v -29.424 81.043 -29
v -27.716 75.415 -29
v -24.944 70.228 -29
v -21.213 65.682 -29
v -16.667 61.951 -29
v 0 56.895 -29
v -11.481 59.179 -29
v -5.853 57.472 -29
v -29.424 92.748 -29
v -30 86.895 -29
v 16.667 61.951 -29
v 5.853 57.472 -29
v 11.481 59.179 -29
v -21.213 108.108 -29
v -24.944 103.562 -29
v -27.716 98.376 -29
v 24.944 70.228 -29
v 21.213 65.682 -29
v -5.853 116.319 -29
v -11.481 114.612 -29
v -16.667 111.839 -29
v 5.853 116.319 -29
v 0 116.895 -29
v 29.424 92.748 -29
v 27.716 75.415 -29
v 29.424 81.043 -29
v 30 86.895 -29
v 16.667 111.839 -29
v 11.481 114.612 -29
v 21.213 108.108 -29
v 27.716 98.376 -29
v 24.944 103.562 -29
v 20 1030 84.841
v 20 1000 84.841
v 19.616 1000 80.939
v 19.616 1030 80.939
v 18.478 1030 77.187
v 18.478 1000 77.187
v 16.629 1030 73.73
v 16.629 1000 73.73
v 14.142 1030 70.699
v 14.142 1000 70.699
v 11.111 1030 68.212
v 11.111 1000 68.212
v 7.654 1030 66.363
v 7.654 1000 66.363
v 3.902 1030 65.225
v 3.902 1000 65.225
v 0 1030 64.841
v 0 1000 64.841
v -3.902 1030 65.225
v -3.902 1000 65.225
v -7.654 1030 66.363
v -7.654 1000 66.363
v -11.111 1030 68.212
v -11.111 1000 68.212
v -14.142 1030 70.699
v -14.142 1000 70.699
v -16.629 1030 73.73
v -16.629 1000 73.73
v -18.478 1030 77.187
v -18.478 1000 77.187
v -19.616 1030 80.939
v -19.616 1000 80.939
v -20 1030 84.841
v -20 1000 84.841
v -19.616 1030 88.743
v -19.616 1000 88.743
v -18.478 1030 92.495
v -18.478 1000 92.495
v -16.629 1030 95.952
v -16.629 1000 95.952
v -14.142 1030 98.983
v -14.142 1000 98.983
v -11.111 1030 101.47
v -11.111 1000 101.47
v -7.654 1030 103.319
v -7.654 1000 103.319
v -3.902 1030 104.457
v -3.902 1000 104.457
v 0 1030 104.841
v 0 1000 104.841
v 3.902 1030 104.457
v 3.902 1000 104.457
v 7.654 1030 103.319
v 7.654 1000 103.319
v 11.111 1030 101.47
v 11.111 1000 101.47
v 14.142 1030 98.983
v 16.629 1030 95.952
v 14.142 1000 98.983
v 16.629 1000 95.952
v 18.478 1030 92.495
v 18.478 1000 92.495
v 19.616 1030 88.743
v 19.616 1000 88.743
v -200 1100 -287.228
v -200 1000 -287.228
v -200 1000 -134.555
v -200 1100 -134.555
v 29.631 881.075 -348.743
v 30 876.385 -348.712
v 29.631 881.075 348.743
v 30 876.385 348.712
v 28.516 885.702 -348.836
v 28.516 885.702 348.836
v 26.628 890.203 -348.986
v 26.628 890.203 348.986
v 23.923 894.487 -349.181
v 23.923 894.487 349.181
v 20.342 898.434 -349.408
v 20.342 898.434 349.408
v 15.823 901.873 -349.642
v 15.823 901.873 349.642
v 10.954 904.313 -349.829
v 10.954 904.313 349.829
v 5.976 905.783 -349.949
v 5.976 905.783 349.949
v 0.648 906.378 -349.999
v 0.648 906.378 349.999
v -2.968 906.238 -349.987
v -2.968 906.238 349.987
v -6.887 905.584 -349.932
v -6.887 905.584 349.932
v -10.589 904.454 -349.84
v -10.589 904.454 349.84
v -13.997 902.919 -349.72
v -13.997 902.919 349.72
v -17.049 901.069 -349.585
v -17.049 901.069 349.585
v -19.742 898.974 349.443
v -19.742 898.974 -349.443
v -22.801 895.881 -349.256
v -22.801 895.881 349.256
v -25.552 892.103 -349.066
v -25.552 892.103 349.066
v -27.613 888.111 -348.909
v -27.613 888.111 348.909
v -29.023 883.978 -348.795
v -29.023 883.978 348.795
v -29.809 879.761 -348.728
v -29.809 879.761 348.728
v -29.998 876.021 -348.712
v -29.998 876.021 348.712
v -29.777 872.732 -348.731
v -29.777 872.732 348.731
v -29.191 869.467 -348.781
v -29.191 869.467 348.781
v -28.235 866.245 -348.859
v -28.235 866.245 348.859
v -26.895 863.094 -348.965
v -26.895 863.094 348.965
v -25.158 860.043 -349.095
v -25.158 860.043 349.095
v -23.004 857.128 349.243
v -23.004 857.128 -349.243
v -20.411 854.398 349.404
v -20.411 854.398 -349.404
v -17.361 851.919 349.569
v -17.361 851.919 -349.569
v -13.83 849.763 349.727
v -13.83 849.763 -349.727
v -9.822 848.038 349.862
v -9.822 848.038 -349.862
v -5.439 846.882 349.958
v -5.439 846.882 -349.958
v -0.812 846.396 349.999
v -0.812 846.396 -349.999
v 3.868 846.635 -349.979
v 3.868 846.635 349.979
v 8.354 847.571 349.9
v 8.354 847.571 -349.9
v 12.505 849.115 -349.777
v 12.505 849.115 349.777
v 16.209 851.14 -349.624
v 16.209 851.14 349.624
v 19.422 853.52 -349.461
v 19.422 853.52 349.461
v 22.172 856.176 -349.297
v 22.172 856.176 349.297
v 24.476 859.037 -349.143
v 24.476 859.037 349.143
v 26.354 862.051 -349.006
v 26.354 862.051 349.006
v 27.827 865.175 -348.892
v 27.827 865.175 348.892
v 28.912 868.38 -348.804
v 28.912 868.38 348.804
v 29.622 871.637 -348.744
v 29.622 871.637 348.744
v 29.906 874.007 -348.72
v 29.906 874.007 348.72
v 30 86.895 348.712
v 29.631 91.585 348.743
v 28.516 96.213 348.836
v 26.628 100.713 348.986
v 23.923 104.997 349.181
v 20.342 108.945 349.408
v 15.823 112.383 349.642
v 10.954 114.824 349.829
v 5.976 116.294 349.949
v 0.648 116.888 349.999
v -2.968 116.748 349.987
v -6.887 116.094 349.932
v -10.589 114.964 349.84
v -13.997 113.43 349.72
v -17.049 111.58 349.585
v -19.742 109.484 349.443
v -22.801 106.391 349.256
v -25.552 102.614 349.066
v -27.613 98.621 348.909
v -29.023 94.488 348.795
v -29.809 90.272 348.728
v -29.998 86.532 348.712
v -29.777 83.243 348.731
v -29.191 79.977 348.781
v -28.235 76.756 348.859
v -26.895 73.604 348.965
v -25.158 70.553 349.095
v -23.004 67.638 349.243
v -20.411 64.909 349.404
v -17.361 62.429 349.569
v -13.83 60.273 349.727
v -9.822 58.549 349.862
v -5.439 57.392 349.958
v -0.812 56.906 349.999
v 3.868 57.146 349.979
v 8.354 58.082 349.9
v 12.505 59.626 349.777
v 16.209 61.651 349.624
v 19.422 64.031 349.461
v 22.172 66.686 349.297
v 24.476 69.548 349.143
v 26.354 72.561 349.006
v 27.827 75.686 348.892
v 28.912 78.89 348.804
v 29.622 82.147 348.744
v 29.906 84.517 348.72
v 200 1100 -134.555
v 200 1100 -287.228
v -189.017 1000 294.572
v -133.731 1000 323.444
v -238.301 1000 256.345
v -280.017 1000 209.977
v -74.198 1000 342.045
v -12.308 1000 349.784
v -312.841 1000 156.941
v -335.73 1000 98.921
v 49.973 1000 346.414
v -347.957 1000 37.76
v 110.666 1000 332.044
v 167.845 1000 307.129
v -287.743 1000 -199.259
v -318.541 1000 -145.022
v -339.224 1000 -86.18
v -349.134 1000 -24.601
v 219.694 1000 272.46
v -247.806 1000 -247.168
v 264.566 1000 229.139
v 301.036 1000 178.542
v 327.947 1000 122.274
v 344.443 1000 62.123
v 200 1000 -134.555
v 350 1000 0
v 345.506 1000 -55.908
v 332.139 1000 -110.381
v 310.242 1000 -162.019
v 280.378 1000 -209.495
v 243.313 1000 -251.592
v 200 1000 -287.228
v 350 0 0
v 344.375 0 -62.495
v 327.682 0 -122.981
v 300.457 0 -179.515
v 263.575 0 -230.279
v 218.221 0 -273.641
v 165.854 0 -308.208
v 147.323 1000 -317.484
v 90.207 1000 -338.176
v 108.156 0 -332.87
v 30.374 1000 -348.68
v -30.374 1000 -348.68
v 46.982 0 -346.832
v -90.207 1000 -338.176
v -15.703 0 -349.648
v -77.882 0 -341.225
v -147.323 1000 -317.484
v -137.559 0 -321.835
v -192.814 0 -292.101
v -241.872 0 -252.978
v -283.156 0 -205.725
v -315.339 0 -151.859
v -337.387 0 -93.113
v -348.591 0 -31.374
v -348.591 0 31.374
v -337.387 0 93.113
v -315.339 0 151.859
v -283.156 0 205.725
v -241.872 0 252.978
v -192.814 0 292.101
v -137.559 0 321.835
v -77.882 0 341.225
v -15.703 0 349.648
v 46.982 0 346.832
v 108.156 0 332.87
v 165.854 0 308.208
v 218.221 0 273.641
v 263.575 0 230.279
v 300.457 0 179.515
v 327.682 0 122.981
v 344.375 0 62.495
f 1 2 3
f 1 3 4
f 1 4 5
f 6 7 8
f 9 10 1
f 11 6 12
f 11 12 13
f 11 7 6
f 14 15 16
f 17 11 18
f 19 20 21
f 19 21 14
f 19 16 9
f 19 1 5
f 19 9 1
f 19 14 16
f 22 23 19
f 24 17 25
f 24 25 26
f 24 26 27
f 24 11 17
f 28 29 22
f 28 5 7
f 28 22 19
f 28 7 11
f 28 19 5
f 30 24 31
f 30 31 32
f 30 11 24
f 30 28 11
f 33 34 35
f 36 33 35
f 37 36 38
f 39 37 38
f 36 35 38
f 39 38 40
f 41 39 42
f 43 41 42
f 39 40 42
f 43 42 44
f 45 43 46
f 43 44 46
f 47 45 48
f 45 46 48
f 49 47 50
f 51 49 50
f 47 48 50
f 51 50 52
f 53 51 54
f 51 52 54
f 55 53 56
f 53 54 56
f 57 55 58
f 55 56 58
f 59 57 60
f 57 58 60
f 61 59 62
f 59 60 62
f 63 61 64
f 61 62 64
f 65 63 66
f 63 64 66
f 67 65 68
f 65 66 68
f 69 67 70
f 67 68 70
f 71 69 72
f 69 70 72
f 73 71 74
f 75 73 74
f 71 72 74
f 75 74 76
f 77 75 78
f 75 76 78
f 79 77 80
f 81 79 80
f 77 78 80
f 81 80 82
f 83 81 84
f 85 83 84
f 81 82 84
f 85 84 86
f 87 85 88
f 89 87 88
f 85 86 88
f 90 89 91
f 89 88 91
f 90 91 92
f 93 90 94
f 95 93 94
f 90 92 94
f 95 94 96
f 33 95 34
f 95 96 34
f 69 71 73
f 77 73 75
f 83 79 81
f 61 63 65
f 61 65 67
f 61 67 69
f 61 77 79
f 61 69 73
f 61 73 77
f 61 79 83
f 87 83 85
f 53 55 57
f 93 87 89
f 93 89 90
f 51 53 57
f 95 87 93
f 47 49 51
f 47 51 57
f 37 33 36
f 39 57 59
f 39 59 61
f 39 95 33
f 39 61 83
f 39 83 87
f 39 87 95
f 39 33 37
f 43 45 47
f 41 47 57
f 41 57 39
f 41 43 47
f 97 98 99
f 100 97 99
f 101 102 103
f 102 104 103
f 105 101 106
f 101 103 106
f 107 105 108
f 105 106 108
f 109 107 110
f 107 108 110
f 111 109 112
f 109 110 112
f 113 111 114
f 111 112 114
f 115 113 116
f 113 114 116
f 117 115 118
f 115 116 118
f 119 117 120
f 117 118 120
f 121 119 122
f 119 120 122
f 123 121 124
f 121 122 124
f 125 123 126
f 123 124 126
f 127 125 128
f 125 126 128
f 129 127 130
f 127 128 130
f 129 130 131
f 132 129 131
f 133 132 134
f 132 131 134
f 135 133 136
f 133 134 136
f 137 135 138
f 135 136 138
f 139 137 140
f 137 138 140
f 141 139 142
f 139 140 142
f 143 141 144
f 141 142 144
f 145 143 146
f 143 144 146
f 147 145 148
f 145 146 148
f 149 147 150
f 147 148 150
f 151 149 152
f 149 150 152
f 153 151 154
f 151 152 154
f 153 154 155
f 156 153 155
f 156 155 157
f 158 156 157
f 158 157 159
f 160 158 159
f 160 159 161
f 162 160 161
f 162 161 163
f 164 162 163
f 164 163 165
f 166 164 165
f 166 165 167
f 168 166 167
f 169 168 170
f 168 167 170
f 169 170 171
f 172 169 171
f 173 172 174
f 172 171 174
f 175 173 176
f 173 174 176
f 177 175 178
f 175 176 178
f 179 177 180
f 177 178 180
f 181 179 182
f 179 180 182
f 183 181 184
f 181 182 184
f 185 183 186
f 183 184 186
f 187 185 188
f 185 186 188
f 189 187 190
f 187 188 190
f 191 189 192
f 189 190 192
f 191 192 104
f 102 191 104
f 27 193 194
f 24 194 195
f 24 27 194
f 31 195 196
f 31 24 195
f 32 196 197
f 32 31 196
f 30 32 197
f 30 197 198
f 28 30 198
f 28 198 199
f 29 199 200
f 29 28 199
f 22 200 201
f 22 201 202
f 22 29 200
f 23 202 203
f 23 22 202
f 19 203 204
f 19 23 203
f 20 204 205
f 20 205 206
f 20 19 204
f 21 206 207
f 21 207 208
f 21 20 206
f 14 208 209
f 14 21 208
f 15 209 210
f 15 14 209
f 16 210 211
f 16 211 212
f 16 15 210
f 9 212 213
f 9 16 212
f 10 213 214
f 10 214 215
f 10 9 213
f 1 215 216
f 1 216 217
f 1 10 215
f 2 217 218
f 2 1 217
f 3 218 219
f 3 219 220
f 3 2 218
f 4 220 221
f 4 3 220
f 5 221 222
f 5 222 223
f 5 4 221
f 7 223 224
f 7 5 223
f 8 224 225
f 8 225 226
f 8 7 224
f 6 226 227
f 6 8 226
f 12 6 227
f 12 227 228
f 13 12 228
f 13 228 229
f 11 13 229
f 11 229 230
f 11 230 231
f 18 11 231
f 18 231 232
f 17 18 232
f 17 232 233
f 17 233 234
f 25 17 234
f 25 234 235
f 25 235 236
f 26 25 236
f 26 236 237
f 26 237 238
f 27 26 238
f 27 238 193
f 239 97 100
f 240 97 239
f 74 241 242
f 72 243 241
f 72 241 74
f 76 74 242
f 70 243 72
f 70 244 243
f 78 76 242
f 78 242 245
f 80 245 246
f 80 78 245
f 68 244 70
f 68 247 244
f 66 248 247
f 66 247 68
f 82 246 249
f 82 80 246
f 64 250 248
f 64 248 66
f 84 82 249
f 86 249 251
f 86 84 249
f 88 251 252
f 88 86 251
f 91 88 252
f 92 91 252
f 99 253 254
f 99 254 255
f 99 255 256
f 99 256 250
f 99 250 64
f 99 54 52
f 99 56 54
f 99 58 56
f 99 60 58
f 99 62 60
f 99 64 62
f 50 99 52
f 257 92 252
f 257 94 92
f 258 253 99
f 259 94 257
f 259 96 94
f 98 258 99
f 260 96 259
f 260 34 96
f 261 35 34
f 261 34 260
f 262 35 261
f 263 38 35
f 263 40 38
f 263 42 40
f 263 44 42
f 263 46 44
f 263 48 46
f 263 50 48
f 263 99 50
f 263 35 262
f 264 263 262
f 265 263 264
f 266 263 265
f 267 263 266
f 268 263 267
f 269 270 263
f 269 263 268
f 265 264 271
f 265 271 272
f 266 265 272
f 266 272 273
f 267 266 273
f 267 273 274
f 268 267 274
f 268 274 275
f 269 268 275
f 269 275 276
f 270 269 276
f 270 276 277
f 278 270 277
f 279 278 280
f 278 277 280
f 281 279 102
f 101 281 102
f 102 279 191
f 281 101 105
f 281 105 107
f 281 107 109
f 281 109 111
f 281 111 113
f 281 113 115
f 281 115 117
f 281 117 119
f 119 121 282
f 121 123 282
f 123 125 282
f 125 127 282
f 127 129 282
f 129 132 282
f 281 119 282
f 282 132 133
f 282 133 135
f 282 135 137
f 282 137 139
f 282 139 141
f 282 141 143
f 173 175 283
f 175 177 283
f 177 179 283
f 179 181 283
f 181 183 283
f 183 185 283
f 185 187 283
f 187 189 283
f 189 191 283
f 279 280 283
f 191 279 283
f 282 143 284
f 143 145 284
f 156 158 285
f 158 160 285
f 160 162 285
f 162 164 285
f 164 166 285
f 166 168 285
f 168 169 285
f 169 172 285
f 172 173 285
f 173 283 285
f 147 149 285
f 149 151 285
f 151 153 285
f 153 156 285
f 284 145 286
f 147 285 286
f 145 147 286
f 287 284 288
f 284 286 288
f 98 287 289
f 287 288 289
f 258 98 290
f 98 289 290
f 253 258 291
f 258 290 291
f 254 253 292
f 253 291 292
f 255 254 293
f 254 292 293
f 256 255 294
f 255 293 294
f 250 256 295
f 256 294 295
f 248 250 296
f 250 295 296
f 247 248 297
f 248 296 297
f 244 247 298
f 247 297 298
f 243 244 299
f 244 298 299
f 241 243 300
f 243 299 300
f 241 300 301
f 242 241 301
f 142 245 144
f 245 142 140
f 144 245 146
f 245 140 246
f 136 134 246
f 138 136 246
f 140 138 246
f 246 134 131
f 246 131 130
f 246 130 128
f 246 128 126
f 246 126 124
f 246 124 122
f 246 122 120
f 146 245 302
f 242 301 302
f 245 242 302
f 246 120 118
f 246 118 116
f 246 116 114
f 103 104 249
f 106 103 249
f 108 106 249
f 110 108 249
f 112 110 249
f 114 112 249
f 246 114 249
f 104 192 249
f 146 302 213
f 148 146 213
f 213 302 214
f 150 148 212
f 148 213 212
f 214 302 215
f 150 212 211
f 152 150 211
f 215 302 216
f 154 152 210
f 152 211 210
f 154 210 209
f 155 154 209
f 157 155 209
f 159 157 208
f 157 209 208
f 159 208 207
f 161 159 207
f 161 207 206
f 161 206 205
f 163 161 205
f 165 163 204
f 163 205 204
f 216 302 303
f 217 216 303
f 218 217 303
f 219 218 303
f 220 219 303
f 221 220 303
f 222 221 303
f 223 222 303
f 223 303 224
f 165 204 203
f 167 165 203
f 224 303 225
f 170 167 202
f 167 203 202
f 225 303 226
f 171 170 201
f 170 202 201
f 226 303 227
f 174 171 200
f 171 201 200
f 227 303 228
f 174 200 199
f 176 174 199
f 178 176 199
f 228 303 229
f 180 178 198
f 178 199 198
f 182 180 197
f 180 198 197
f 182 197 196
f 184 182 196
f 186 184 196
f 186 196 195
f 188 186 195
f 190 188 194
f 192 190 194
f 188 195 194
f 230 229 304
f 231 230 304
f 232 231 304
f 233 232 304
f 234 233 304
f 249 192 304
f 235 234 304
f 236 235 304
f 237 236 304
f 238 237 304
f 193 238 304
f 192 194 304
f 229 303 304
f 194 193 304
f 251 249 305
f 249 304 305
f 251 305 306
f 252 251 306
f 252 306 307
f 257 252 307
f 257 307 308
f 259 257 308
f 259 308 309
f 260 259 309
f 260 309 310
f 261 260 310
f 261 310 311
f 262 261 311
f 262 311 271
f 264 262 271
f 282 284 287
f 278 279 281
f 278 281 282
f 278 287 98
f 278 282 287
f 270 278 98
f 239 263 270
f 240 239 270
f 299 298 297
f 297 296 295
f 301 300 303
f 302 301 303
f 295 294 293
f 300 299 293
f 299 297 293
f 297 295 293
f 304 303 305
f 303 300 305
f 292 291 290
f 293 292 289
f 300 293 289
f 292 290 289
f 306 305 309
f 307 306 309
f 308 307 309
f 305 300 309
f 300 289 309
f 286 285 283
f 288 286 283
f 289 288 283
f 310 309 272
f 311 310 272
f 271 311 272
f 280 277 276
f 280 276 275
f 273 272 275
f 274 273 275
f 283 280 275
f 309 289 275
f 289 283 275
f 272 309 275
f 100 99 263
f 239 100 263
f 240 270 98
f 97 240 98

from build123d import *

# Parameters (mm, degrees)
SKETCH2_R               = 350
BOSS_EXTRUDE1_DEPTH     = 1000
SKETCH3_R               = 20
BOSS_EXTRUDE2_DEPTH     = 30
BOSS_EXTRUDE3_DEPTH     = 100
SKETCH5_R               = 30
CUT_EXTRUDE1_DEPTH      = 351
CUT_EXTRUDE1_DEPTH_BACK = 351
SKETCH6_R               = 30
CUT_EXTRUDE2_DEPTH      = 351.000000102
CUT_EXTRUDE2_DEPTH_BACK = 29


with BuildPart() as part:
    # Sketch2 → Boss-Extrude1 (new body)
    with BuildSketch(Plane(origin=(0, 0, 0), x_dir=(1, 0, 0), z_dir=(0, 1, 0))):
        Circle(SKETCH2_R)
    extrude(amount=BOSS_EXTRUDE1_DEPTH)

    # Sketch3 → Boss-Extrude2 (add)
    with BuildSketch(Plane(origin=(0, 1000, 0), x_dir=(1, 0, 0), z_dir=(0, 1, 0))):
        with Locations((0, -84.841088142)):
            Circle(SKETCH3_R)
    extrude(amount=BOSS_EXTRUDE2_DEPTH)

    # Sketch4 → Boss-Extrude3 (add)
    with BuildSketch(Plane(origin=(0, 1000, 0), x_dir=(1, 0, 0), z_dir=(0, 1, 0))):
        Polygon((0, 134.555021266), (200, 134.555021266), (200, 287.228132327), (-200, 287.228132327), (-200, 134.555021266), align=None)
    extrude(amount=BOSS_EXTRUDE3_DEPTH)

    # Sketch5 → Cut-Extrude1 (cut, two sides)
    with BuildSketch(Plane.XY) as cut_extrude1_sk:
        with Locations((0, 876.38470429)):
            Circle(SKETCH5_R)
    extrude(amount=CUT_EXTRUDE1_DEPTH, mode=Mode.SUBTRACT)
    extrude(cut_extrude1_sk.sketch, amount=-CUT_EXTRUDE1_DEPTH_BACK, mode=Mode.SUBTRACT)

    # Sketch6 → Cut-Extrude2 (cut, two sides)
    with BuildSketch(Plane.XY) as cut_extrude2_sk:
        with Locations((0, 86.895276968)):
            Circle(SKETCH6_R)
    extrude(amount=CUT_EXTRUDE2_DEPTH, mode=Mode.SUBTRACT)
    extrude(cut_extrude2_sk.sketch, amount=-CUT_EXTRUDE2_DEPTH_BACK, mode=Mode.SUBTRACT)


solid = part.part
